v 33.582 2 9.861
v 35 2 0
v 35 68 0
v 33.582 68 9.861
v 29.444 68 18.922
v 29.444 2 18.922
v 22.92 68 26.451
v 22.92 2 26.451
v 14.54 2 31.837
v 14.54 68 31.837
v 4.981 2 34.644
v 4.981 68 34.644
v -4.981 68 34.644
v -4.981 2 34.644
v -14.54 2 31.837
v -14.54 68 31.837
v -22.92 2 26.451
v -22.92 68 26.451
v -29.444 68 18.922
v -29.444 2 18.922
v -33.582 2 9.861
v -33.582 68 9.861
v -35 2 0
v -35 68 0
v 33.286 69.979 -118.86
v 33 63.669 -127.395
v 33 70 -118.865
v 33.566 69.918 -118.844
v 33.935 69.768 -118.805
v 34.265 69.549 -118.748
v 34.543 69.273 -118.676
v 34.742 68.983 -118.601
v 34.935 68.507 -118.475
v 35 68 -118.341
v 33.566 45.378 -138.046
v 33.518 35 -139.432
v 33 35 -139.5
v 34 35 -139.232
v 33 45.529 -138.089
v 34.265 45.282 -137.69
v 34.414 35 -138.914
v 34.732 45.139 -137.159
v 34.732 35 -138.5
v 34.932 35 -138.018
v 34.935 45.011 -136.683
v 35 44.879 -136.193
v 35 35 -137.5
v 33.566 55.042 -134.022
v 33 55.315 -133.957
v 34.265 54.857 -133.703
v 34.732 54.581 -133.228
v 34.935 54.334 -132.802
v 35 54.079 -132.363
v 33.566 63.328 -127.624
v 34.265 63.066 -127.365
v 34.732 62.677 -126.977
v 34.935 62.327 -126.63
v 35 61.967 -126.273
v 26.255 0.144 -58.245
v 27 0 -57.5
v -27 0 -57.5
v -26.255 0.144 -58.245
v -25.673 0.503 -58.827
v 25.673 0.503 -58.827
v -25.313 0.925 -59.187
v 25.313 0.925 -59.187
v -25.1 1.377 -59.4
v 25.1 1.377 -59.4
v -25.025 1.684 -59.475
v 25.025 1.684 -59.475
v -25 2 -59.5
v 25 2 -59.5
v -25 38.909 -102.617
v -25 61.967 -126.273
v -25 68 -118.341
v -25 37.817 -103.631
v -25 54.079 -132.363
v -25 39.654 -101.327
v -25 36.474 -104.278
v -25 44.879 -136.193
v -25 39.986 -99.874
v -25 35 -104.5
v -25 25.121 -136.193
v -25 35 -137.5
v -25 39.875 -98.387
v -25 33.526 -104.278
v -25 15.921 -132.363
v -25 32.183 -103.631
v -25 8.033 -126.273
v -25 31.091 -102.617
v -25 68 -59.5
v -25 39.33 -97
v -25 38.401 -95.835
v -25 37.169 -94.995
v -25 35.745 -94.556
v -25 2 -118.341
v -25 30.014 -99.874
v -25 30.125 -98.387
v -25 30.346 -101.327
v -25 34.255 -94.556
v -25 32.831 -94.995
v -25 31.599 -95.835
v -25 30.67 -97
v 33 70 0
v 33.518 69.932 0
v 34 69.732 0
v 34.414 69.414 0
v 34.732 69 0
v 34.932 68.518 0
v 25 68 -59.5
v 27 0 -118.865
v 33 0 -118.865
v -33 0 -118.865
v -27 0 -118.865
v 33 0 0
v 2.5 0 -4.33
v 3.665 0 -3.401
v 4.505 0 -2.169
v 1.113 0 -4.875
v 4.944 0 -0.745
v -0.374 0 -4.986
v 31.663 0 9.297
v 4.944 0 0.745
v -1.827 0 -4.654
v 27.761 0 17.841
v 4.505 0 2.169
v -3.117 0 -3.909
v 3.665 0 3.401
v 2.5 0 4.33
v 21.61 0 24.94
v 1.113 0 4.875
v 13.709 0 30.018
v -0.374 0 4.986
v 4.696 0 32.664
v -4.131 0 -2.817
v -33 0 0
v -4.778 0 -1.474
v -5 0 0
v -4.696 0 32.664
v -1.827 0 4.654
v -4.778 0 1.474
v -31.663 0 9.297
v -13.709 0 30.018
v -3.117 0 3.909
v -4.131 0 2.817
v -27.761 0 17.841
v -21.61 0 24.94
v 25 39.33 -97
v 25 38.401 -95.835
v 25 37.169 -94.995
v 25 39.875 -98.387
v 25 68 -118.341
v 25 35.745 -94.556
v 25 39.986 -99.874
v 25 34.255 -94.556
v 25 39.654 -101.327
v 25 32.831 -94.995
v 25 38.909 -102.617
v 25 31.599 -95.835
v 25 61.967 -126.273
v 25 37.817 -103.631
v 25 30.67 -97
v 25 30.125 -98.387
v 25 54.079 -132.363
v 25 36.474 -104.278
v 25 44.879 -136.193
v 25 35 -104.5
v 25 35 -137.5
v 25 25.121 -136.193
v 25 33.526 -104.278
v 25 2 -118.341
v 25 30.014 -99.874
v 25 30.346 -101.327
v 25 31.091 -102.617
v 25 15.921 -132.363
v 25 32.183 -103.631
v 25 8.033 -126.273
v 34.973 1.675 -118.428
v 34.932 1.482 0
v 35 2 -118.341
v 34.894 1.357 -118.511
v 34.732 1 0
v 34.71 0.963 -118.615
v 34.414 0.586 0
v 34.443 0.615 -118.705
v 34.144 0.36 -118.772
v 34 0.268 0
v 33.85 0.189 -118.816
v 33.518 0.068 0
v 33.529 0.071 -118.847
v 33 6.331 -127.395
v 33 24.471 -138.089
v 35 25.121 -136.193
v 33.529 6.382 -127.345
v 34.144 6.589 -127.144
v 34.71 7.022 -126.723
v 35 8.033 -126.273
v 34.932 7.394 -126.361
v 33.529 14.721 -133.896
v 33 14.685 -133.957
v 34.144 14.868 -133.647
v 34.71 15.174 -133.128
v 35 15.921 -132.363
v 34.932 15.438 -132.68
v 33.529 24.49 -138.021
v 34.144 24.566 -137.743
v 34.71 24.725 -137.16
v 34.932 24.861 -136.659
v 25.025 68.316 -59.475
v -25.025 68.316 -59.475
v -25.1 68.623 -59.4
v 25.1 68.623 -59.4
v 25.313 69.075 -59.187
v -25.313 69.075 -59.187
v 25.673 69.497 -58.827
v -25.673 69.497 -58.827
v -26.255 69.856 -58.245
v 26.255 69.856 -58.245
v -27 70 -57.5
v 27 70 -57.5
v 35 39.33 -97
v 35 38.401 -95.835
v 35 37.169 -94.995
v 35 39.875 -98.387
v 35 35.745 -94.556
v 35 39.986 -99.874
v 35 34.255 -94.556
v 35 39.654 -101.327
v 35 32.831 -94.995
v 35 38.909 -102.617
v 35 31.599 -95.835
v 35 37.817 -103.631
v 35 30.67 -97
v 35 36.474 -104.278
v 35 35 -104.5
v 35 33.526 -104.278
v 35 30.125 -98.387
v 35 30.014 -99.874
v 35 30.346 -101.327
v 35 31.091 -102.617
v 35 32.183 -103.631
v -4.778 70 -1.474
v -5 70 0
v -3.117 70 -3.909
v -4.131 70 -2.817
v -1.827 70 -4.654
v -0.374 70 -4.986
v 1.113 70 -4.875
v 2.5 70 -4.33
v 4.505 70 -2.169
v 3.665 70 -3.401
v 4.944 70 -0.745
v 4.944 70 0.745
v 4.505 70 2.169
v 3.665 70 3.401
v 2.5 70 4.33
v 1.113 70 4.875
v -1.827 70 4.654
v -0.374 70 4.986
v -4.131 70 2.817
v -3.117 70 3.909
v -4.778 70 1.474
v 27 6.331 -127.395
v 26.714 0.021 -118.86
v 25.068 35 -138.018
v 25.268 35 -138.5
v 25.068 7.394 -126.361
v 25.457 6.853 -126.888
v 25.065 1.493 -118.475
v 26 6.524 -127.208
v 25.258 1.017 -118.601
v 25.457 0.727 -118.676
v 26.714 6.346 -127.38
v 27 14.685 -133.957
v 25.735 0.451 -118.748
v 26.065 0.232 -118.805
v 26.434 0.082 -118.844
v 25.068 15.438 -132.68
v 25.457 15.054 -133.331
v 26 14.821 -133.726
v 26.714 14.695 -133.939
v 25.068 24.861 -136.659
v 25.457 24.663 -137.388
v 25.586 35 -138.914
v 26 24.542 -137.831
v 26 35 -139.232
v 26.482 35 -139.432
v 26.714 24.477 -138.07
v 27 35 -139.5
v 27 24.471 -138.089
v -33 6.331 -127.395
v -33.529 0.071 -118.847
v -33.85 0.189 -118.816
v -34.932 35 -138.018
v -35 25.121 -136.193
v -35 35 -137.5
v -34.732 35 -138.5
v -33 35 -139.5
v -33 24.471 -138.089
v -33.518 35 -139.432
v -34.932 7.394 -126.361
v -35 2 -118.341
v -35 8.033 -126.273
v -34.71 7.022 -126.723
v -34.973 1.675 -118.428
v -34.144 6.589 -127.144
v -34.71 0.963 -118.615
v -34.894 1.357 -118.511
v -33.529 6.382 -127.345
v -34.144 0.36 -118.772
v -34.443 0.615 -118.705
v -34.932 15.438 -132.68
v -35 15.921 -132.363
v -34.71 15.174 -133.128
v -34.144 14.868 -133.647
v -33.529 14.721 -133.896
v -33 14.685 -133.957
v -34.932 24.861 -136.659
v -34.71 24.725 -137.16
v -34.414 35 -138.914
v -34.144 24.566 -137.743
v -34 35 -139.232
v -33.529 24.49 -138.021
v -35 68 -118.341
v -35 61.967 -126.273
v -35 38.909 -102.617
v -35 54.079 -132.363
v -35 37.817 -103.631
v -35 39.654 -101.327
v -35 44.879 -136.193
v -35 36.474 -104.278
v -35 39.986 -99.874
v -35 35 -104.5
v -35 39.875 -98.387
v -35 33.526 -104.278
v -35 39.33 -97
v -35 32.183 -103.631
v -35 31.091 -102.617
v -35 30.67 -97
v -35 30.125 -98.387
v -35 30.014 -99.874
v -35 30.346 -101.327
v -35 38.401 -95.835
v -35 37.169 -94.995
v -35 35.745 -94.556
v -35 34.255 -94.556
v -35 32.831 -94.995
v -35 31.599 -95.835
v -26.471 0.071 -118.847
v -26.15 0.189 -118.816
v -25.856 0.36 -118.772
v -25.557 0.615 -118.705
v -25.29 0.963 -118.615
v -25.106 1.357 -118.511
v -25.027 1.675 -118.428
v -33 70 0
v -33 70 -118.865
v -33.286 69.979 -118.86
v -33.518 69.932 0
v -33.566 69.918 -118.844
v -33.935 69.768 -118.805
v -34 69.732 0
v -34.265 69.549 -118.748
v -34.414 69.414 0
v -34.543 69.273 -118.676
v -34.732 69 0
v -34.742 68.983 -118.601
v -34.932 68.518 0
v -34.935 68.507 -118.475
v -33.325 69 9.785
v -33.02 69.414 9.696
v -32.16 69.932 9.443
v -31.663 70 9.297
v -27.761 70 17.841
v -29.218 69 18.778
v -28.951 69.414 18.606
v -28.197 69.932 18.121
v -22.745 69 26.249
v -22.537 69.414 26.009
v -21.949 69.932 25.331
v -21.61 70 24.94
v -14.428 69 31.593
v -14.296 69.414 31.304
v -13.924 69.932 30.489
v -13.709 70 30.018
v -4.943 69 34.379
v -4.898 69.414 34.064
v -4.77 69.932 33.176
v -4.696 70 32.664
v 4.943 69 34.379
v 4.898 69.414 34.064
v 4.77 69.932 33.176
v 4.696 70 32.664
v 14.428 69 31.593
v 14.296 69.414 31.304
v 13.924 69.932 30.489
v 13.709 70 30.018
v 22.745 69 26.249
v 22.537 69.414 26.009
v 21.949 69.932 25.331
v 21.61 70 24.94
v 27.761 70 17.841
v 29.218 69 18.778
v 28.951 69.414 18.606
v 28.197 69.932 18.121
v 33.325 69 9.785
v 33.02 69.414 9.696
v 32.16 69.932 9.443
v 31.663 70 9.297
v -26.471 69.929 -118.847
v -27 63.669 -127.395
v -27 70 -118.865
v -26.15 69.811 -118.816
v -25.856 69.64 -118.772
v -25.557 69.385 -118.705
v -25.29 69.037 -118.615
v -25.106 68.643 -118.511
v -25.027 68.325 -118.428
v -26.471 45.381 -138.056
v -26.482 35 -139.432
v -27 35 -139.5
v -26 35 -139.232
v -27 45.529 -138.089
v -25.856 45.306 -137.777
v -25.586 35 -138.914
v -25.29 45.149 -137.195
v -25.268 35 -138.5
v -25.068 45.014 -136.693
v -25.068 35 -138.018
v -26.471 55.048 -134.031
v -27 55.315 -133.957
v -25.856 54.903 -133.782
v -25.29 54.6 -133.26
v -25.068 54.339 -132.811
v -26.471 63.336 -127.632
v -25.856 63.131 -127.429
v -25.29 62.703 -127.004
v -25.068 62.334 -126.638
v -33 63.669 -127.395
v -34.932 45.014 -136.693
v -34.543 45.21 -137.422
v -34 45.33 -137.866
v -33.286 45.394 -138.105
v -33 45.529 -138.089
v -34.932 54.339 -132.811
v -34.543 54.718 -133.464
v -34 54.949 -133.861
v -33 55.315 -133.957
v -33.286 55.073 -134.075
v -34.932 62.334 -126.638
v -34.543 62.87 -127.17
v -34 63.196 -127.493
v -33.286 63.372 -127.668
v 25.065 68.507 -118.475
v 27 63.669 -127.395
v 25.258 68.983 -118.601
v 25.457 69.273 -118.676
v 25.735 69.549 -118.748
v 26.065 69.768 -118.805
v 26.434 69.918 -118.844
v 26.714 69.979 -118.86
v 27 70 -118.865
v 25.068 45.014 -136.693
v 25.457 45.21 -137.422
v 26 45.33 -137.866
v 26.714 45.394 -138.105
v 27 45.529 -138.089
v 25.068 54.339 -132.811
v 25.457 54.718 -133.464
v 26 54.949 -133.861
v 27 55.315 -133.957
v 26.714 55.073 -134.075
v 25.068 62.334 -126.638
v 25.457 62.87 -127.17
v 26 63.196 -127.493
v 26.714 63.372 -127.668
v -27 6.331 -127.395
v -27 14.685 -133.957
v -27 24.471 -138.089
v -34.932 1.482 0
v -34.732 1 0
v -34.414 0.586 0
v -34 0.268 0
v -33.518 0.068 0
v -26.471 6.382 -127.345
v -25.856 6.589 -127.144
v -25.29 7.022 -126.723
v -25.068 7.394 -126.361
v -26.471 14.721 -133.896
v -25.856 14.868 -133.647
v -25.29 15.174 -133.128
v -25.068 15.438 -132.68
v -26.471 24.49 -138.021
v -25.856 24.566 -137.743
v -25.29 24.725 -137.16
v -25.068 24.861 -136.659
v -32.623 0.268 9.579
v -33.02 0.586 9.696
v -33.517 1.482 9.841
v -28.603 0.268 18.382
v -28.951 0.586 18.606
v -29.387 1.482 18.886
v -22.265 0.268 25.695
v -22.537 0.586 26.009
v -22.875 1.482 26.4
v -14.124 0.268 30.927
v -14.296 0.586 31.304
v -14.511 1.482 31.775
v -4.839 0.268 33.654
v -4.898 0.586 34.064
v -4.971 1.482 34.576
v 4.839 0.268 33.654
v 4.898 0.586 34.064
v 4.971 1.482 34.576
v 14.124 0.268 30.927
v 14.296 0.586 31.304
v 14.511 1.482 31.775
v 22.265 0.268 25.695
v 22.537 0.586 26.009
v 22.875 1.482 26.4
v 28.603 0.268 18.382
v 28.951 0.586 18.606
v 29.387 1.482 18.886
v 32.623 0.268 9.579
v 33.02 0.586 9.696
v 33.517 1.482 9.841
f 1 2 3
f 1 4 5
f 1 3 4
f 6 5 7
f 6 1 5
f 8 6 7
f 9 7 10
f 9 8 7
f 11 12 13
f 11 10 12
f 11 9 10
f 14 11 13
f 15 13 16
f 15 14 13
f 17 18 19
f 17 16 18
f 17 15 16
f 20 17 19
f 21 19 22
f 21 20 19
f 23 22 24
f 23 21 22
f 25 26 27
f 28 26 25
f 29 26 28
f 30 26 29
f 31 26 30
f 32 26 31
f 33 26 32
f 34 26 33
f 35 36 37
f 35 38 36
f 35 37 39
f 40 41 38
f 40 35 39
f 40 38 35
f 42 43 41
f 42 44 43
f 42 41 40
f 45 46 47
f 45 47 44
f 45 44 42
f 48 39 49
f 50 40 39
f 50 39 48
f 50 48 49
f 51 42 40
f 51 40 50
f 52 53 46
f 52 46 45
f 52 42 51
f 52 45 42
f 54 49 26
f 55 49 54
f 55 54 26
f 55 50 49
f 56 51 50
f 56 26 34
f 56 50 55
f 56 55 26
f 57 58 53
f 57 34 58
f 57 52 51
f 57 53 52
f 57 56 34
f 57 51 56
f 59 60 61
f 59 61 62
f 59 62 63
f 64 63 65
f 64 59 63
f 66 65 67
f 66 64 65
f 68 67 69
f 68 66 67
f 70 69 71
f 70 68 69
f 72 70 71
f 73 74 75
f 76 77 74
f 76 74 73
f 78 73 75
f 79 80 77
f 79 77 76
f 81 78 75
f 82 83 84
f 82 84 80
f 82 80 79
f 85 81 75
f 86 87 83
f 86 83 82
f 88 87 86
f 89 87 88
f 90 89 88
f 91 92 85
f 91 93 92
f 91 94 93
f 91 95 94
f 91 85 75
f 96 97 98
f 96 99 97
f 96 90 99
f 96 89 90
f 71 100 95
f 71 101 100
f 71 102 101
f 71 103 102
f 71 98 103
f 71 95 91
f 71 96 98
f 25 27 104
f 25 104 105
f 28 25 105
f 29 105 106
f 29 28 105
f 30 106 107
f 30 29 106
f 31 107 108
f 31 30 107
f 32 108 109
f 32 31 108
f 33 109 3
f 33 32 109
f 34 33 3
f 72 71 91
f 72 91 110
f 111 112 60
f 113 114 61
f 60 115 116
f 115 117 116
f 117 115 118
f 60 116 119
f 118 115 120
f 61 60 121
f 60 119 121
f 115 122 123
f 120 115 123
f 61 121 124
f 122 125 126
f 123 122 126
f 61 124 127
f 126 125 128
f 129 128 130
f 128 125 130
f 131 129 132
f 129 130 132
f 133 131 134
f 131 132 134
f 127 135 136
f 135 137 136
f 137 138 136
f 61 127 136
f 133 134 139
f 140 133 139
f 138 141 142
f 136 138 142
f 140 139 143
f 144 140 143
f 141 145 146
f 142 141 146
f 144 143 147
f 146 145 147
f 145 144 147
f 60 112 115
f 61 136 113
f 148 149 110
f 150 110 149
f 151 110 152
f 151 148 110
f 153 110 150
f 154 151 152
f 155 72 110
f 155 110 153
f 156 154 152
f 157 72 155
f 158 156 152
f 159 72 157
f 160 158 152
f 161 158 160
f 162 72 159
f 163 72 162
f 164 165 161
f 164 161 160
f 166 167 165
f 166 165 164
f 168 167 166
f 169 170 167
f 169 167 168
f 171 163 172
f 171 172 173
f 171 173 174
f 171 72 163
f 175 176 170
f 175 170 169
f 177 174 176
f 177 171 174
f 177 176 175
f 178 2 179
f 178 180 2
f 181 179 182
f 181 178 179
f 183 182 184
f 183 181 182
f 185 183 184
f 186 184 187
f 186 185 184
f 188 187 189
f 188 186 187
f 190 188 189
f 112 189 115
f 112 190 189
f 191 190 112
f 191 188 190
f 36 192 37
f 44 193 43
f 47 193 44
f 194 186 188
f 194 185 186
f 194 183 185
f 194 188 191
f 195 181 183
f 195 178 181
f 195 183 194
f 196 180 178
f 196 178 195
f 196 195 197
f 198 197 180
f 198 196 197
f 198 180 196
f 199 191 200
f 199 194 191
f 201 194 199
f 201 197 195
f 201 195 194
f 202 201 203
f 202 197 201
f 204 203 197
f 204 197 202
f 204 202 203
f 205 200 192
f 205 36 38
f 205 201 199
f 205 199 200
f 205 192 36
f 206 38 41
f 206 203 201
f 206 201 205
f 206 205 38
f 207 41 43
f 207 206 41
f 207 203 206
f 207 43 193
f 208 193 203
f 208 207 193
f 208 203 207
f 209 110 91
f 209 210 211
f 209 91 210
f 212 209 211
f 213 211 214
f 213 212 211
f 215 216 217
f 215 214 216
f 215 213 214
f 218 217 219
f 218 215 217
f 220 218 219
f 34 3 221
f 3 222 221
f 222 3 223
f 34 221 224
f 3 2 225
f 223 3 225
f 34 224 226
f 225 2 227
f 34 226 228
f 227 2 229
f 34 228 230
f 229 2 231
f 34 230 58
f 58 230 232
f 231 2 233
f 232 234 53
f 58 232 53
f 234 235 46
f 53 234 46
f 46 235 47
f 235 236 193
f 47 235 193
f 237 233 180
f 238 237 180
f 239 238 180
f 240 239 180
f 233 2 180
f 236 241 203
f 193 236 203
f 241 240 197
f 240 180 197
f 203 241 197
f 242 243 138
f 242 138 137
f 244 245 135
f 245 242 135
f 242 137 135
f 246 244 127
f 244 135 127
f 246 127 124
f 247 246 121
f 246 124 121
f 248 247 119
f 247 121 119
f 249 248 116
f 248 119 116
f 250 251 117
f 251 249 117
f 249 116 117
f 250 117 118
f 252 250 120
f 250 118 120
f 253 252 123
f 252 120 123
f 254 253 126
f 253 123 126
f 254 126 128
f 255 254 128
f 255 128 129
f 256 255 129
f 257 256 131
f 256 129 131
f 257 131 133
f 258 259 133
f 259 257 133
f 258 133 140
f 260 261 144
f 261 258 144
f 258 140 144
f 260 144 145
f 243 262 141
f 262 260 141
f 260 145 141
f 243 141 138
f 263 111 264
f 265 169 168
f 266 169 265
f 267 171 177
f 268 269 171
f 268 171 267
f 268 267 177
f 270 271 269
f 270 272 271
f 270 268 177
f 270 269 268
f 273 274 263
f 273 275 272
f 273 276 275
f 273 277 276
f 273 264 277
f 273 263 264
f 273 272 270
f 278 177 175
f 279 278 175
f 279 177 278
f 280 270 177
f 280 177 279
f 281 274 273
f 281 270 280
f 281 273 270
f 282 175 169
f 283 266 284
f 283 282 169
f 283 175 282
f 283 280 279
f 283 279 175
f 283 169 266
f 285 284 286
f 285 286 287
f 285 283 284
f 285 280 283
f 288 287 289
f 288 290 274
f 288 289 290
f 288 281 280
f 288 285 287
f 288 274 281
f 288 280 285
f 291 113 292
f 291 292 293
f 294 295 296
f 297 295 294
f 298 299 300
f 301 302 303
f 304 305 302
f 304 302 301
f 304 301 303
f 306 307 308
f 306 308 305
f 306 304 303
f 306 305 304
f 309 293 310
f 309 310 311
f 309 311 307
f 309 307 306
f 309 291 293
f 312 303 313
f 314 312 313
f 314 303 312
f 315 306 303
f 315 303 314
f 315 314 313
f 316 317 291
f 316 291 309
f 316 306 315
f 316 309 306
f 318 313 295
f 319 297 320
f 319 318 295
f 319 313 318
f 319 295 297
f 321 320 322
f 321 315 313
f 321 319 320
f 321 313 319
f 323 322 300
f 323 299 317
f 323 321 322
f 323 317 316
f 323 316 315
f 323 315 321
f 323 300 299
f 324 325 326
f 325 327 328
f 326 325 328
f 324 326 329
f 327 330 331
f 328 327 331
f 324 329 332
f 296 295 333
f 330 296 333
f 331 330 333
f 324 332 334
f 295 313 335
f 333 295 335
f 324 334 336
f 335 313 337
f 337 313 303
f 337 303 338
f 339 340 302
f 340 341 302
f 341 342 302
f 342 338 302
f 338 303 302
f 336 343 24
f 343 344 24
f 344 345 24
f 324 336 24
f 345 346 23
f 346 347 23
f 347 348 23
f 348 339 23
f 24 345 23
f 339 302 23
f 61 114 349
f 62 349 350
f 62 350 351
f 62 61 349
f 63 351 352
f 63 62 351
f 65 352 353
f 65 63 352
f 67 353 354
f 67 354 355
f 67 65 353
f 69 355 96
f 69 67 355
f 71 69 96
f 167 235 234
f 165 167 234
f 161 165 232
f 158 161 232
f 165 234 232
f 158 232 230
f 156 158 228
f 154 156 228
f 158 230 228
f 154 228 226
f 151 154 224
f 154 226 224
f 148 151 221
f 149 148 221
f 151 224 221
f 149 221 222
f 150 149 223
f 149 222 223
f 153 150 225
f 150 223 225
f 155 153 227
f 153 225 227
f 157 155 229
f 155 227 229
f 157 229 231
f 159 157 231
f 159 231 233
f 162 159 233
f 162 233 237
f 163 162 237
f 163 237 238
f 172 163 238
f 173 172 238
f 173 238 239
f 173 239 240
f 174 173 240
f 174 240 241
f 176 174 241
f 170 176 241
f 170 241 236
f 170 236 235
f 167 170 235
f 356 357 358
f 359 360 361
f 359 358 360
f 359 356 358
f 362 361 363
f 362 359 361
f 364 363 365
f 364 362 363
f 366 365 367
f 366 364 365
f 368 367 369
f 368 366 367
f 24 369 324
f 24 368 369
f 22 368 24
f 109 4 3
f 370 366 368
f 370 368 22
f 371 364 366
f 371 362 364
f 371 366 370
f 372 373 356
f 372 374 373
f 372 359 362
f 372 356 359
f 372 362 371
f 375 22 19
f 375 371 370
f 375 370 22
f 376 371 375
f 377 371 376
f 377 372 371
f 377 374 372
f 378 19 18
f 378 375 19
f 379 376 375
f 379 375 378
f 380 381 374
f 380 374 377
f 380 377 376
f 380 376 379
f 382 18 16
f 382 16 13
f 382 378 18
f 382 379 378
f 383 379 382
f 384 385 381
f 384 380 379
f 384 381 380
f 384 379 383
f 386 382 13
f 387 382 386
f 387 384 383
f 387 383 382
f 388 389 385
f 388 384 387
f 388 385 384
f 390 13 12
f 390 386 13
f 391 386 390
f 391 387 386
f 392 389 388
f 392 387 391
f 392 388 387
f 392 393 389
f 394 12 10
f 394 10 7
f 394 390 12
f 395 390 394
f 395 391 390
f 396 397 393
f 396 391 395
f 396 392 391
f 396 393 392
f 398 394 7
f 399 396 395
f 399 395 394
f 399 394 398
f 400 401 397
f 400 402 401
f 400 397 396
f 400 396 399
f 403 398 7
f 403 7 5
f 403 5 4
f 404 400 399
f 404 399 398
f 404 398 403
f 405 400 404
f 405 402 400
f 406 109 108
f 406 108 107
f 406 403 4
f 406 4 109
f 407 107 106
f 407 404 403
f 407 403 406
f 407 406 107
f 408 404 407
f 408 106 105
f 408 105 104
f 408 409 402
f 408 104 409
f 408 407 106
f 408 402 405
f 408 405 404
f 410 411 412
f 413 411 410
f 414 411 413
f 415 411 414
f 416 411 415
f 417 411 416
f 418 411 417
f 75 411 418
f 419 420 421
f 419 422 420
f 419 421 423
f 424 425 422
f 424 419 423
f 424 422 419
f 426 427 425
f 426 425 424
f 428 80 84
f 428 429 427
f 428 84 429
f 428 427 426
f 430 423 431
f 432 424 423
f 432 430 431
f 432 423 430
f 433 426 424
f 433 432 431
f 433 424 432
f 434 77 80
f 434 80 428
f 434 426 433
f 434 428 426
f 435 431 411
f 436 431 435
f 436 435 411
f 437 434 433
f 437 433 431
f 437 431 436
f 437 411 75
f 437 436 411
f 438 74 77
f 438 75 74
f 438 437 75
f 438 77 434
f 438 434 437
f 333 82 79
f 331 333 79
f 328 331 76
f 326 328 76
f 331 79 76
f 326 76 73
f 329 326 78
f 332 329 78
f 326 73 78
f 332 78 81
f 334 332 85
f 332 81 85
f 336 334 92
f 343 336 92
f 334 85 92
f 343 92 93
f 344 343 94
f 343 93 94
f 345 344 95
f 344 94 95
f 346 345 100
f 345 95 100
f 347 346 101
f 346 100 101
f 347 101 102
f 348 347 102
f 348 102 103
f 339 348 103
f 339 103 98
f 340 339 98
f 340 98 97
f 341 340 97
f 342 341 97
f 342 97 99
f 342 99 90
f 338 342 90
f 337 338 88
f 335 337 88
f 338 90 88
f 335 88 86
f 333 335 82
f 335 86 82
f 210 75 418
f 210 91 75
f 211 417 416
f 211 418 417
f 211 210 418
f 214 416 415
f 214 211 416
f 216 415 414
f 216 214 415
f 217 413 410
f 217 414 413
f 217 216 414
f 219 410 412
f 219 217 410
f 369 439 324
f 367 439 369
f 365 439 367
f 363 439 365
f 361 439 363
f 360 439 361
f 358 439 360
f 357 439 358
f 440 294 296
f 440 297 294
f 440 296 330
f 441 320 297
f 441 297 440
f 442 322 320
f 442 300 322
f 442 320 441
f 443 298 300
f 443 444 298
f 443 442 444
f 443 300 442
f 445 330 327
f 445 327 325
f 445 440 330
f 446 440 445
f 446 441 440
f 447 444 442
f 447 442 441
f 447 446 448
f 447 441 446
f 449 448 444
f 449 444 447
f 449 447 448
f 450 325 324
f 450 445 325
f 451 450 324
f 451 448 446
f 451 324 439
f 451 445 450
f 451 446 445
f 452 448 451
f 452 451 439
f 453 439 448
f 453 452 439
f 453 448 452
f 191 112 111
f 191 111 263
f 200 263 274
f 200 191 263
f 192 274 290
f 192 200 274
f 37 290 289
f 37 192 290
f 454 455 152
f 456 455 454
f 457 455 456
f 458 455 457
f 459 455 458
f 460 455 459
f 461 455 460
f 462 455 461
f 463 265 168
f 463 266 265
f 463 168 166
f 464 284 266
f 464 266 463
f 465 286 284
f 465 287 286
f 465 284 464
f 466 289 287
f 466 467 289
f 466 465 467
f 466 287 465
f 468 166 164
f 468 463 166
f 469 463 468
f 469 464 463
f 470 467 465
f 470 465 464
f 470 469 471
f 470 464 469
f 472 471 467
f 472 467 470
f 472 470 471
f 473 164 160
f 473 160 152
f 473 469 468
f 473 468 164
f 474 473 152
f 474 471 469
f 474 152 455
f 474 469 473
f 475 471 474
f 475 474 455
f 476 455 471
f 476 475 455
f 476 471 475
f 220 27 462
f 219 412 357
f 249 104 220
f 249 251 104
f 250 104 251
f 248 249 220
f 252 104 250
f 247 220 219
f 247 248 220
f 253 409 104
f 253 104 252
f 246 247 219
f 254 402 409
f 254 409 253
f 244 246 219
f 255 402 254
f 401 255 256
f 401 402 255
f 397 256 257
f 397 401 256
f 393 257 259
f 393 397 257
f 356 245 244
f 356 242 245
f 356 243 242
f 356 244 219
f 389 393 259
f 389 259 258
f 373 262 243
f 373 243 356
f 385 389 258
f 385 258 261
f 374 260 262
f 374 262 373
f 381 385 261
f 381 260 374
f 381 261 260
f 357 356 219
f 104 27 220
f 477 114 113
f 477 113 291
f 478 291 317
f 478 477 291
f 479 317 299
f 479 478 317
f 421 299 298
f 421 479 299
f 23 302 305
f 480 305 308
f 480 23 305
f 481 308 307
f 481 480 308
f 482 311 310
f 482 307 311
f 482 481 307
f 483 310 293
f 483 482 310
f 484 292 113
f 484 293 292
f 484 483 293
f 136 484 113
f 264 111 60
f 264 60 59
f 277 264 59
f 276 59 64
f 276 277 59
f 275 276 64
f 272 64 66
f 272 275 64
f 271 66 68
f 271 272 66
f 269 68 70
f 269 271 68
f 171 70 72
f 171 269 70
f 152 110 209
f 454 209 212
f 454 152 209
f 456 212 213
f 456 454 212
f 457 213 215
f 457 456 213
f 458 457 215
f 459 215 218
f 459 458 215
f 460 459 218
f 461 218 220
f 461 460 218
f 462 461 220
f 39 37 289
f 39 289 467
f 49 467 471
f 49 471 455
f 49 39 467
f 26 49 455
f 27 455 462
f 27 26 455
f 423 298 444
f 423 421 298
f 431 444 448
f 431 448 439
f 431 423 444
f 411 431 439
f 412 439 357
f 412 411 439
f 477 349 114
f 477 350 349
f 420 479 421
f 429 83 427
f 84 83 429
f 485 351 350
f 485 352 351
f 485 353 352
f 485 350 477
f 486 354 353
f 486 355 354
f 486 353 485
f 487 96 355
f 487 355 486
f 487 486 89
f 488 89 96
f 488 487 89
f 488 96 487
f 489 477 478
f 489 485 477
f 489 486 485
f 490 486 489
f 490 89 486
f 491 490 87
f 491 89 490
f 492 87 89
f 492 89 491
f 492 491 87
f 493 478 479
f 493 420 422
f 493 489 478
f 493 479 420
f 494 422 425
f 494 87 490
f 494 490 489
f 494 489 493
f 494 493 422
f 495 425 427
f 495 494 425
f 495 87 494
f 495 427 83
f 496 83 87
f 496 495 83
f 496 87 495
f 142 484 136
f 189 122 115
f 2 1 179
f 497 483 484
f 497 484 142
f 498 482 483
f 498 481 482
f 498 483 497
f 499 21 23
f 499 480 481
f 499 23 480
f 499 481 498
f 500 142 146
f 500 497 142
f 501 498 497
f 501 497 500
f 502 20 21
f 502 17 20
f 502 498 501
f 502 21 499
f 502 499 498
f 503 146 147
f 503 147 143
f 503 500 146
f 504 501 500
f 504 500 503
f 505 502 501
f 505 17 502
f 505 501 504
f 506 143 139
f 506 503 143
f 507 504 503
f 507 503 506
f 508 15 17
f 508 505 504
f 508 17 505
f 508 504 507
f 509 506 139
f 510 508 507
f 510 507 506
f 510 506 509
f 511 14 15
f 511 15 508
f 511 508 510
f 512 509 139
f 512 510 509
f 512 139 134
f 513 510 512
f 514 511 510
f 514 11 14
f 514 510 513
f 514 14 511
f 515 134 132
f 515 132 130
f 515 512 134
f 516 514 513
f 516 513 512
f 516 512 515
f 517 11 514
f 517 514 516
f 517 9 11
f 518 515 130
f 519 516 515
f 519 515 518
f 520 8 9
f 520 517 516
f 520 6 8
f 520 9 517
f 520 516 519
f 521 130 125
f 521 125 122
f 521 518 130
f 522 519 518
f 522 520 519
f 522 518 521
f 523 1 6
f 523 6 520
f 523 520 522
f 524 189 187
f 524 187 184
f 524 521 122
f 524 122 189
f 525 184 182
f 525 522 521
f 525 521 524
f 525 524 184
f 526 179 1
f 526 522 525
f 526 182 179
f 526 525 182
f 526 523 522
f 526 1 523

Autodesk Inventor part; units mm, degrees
ref_plane "YZ Plane" through (0, 0, 0) normal (1, 0, 0) x (0, 1, 0)
ref_plane "XZ Plane" through (0, 0, 0) normal (0, 1, 0) x (-1, 0, 0)
ref_plane "XY Plane" through (0, 0, 0) normal (0, 0, 1) x (1, 0, 0)
sketch "Sketch1" plane through (0, 0, 0) normal (0, 1, 0) x (-1, 0, 0)
  arc A0 (35, 0) -> (-35, 0) centre (0, 0) ccw
  line L0 (35, 0) -> (-35, 0) construction
  line L1 (-35, 0) -> (-35, -139.5)
  line L2 (-35, -139.5) -> (35, -139.5)
  line L3 (35, -139.5) -> (35, 0)
  arc A1 (-35, 0) -> (35, 0) centre (0, 0) ccw construction
  line L4 (-25, -139.5) -> (25, -139.5)
  line L5 (25, -139.5) -> (25, -59.5)
  line L6 (25, -59.5) -> (-25, -59.5)
  line L7 (-25, -59.5) -> (-25, -139.5)
  circle A2 centre (0, 0) radius 5
  point P0 (25, -139.5)
  dimension "d0" = 70
  dimension "d1" = 139.5
  dimension "d2" = 10
  dimension "d3" = 10
  dimension "d4" = 80
  dimension "d11" = 10
extrude "Extrusion1" add sketch "Sketch1" along normal blind 70 contours L3 L2 L5 L6 L7 L1 A0
sketch "Sketch2" plane through (35, 0, 0) normal (1, 0, 0) x (0, 0, -1)
  line L0 (0, 0) -> (139.5, 0) projected
  line L1 (139.5, 0) -> (139.5, 70) projected
  line L2 (0, 70) -> (139.5, 70) projected
  line L3 (0, 0) -> (0, 70) projected
  arc A0 (118.8649, 70) -> (118.8649, 0) centre (99.5, 35) ccw
  line L4 (99.5, 35) -> (139.5, 35)
  arc A1 (139.5, 35) -> (118.8649, 70) centre (99.5, 35) ccw
  arc A2 (118.8649, 0) -> (139.5, 35) centre (99.5, 35) ccw
  circle A3 centre (99.5, 35) radius 5
  point P0 (0, 0)
  dimension "d7" = 80
  dimension "d8" = 10
extrude "Extrusion2" cut sketch "Sketch2" against normal through all contours A2 L1 L0 | A3 | A1 L2 L1
fillet "Fillet1" radius 2 16 edges at (0, 70, 35) (-35, 70, -59.4325) (35, 70, -59.4325) (0, 0, 35) (-35, 0, -59.4325) (35, 0, -59.4325) (-25, 35, -139.5) (35, 35, -139.5) (25, 35, -139.5) (-35, 35, -139.5) (-25, 70, -89.1825) (0, 70, -59.5) (0, 0, -59.5) (25, 0, -89.1825) (25, 70, -89.1825) (-25, 0, -89.1825)
properties part number "Wirst1"
